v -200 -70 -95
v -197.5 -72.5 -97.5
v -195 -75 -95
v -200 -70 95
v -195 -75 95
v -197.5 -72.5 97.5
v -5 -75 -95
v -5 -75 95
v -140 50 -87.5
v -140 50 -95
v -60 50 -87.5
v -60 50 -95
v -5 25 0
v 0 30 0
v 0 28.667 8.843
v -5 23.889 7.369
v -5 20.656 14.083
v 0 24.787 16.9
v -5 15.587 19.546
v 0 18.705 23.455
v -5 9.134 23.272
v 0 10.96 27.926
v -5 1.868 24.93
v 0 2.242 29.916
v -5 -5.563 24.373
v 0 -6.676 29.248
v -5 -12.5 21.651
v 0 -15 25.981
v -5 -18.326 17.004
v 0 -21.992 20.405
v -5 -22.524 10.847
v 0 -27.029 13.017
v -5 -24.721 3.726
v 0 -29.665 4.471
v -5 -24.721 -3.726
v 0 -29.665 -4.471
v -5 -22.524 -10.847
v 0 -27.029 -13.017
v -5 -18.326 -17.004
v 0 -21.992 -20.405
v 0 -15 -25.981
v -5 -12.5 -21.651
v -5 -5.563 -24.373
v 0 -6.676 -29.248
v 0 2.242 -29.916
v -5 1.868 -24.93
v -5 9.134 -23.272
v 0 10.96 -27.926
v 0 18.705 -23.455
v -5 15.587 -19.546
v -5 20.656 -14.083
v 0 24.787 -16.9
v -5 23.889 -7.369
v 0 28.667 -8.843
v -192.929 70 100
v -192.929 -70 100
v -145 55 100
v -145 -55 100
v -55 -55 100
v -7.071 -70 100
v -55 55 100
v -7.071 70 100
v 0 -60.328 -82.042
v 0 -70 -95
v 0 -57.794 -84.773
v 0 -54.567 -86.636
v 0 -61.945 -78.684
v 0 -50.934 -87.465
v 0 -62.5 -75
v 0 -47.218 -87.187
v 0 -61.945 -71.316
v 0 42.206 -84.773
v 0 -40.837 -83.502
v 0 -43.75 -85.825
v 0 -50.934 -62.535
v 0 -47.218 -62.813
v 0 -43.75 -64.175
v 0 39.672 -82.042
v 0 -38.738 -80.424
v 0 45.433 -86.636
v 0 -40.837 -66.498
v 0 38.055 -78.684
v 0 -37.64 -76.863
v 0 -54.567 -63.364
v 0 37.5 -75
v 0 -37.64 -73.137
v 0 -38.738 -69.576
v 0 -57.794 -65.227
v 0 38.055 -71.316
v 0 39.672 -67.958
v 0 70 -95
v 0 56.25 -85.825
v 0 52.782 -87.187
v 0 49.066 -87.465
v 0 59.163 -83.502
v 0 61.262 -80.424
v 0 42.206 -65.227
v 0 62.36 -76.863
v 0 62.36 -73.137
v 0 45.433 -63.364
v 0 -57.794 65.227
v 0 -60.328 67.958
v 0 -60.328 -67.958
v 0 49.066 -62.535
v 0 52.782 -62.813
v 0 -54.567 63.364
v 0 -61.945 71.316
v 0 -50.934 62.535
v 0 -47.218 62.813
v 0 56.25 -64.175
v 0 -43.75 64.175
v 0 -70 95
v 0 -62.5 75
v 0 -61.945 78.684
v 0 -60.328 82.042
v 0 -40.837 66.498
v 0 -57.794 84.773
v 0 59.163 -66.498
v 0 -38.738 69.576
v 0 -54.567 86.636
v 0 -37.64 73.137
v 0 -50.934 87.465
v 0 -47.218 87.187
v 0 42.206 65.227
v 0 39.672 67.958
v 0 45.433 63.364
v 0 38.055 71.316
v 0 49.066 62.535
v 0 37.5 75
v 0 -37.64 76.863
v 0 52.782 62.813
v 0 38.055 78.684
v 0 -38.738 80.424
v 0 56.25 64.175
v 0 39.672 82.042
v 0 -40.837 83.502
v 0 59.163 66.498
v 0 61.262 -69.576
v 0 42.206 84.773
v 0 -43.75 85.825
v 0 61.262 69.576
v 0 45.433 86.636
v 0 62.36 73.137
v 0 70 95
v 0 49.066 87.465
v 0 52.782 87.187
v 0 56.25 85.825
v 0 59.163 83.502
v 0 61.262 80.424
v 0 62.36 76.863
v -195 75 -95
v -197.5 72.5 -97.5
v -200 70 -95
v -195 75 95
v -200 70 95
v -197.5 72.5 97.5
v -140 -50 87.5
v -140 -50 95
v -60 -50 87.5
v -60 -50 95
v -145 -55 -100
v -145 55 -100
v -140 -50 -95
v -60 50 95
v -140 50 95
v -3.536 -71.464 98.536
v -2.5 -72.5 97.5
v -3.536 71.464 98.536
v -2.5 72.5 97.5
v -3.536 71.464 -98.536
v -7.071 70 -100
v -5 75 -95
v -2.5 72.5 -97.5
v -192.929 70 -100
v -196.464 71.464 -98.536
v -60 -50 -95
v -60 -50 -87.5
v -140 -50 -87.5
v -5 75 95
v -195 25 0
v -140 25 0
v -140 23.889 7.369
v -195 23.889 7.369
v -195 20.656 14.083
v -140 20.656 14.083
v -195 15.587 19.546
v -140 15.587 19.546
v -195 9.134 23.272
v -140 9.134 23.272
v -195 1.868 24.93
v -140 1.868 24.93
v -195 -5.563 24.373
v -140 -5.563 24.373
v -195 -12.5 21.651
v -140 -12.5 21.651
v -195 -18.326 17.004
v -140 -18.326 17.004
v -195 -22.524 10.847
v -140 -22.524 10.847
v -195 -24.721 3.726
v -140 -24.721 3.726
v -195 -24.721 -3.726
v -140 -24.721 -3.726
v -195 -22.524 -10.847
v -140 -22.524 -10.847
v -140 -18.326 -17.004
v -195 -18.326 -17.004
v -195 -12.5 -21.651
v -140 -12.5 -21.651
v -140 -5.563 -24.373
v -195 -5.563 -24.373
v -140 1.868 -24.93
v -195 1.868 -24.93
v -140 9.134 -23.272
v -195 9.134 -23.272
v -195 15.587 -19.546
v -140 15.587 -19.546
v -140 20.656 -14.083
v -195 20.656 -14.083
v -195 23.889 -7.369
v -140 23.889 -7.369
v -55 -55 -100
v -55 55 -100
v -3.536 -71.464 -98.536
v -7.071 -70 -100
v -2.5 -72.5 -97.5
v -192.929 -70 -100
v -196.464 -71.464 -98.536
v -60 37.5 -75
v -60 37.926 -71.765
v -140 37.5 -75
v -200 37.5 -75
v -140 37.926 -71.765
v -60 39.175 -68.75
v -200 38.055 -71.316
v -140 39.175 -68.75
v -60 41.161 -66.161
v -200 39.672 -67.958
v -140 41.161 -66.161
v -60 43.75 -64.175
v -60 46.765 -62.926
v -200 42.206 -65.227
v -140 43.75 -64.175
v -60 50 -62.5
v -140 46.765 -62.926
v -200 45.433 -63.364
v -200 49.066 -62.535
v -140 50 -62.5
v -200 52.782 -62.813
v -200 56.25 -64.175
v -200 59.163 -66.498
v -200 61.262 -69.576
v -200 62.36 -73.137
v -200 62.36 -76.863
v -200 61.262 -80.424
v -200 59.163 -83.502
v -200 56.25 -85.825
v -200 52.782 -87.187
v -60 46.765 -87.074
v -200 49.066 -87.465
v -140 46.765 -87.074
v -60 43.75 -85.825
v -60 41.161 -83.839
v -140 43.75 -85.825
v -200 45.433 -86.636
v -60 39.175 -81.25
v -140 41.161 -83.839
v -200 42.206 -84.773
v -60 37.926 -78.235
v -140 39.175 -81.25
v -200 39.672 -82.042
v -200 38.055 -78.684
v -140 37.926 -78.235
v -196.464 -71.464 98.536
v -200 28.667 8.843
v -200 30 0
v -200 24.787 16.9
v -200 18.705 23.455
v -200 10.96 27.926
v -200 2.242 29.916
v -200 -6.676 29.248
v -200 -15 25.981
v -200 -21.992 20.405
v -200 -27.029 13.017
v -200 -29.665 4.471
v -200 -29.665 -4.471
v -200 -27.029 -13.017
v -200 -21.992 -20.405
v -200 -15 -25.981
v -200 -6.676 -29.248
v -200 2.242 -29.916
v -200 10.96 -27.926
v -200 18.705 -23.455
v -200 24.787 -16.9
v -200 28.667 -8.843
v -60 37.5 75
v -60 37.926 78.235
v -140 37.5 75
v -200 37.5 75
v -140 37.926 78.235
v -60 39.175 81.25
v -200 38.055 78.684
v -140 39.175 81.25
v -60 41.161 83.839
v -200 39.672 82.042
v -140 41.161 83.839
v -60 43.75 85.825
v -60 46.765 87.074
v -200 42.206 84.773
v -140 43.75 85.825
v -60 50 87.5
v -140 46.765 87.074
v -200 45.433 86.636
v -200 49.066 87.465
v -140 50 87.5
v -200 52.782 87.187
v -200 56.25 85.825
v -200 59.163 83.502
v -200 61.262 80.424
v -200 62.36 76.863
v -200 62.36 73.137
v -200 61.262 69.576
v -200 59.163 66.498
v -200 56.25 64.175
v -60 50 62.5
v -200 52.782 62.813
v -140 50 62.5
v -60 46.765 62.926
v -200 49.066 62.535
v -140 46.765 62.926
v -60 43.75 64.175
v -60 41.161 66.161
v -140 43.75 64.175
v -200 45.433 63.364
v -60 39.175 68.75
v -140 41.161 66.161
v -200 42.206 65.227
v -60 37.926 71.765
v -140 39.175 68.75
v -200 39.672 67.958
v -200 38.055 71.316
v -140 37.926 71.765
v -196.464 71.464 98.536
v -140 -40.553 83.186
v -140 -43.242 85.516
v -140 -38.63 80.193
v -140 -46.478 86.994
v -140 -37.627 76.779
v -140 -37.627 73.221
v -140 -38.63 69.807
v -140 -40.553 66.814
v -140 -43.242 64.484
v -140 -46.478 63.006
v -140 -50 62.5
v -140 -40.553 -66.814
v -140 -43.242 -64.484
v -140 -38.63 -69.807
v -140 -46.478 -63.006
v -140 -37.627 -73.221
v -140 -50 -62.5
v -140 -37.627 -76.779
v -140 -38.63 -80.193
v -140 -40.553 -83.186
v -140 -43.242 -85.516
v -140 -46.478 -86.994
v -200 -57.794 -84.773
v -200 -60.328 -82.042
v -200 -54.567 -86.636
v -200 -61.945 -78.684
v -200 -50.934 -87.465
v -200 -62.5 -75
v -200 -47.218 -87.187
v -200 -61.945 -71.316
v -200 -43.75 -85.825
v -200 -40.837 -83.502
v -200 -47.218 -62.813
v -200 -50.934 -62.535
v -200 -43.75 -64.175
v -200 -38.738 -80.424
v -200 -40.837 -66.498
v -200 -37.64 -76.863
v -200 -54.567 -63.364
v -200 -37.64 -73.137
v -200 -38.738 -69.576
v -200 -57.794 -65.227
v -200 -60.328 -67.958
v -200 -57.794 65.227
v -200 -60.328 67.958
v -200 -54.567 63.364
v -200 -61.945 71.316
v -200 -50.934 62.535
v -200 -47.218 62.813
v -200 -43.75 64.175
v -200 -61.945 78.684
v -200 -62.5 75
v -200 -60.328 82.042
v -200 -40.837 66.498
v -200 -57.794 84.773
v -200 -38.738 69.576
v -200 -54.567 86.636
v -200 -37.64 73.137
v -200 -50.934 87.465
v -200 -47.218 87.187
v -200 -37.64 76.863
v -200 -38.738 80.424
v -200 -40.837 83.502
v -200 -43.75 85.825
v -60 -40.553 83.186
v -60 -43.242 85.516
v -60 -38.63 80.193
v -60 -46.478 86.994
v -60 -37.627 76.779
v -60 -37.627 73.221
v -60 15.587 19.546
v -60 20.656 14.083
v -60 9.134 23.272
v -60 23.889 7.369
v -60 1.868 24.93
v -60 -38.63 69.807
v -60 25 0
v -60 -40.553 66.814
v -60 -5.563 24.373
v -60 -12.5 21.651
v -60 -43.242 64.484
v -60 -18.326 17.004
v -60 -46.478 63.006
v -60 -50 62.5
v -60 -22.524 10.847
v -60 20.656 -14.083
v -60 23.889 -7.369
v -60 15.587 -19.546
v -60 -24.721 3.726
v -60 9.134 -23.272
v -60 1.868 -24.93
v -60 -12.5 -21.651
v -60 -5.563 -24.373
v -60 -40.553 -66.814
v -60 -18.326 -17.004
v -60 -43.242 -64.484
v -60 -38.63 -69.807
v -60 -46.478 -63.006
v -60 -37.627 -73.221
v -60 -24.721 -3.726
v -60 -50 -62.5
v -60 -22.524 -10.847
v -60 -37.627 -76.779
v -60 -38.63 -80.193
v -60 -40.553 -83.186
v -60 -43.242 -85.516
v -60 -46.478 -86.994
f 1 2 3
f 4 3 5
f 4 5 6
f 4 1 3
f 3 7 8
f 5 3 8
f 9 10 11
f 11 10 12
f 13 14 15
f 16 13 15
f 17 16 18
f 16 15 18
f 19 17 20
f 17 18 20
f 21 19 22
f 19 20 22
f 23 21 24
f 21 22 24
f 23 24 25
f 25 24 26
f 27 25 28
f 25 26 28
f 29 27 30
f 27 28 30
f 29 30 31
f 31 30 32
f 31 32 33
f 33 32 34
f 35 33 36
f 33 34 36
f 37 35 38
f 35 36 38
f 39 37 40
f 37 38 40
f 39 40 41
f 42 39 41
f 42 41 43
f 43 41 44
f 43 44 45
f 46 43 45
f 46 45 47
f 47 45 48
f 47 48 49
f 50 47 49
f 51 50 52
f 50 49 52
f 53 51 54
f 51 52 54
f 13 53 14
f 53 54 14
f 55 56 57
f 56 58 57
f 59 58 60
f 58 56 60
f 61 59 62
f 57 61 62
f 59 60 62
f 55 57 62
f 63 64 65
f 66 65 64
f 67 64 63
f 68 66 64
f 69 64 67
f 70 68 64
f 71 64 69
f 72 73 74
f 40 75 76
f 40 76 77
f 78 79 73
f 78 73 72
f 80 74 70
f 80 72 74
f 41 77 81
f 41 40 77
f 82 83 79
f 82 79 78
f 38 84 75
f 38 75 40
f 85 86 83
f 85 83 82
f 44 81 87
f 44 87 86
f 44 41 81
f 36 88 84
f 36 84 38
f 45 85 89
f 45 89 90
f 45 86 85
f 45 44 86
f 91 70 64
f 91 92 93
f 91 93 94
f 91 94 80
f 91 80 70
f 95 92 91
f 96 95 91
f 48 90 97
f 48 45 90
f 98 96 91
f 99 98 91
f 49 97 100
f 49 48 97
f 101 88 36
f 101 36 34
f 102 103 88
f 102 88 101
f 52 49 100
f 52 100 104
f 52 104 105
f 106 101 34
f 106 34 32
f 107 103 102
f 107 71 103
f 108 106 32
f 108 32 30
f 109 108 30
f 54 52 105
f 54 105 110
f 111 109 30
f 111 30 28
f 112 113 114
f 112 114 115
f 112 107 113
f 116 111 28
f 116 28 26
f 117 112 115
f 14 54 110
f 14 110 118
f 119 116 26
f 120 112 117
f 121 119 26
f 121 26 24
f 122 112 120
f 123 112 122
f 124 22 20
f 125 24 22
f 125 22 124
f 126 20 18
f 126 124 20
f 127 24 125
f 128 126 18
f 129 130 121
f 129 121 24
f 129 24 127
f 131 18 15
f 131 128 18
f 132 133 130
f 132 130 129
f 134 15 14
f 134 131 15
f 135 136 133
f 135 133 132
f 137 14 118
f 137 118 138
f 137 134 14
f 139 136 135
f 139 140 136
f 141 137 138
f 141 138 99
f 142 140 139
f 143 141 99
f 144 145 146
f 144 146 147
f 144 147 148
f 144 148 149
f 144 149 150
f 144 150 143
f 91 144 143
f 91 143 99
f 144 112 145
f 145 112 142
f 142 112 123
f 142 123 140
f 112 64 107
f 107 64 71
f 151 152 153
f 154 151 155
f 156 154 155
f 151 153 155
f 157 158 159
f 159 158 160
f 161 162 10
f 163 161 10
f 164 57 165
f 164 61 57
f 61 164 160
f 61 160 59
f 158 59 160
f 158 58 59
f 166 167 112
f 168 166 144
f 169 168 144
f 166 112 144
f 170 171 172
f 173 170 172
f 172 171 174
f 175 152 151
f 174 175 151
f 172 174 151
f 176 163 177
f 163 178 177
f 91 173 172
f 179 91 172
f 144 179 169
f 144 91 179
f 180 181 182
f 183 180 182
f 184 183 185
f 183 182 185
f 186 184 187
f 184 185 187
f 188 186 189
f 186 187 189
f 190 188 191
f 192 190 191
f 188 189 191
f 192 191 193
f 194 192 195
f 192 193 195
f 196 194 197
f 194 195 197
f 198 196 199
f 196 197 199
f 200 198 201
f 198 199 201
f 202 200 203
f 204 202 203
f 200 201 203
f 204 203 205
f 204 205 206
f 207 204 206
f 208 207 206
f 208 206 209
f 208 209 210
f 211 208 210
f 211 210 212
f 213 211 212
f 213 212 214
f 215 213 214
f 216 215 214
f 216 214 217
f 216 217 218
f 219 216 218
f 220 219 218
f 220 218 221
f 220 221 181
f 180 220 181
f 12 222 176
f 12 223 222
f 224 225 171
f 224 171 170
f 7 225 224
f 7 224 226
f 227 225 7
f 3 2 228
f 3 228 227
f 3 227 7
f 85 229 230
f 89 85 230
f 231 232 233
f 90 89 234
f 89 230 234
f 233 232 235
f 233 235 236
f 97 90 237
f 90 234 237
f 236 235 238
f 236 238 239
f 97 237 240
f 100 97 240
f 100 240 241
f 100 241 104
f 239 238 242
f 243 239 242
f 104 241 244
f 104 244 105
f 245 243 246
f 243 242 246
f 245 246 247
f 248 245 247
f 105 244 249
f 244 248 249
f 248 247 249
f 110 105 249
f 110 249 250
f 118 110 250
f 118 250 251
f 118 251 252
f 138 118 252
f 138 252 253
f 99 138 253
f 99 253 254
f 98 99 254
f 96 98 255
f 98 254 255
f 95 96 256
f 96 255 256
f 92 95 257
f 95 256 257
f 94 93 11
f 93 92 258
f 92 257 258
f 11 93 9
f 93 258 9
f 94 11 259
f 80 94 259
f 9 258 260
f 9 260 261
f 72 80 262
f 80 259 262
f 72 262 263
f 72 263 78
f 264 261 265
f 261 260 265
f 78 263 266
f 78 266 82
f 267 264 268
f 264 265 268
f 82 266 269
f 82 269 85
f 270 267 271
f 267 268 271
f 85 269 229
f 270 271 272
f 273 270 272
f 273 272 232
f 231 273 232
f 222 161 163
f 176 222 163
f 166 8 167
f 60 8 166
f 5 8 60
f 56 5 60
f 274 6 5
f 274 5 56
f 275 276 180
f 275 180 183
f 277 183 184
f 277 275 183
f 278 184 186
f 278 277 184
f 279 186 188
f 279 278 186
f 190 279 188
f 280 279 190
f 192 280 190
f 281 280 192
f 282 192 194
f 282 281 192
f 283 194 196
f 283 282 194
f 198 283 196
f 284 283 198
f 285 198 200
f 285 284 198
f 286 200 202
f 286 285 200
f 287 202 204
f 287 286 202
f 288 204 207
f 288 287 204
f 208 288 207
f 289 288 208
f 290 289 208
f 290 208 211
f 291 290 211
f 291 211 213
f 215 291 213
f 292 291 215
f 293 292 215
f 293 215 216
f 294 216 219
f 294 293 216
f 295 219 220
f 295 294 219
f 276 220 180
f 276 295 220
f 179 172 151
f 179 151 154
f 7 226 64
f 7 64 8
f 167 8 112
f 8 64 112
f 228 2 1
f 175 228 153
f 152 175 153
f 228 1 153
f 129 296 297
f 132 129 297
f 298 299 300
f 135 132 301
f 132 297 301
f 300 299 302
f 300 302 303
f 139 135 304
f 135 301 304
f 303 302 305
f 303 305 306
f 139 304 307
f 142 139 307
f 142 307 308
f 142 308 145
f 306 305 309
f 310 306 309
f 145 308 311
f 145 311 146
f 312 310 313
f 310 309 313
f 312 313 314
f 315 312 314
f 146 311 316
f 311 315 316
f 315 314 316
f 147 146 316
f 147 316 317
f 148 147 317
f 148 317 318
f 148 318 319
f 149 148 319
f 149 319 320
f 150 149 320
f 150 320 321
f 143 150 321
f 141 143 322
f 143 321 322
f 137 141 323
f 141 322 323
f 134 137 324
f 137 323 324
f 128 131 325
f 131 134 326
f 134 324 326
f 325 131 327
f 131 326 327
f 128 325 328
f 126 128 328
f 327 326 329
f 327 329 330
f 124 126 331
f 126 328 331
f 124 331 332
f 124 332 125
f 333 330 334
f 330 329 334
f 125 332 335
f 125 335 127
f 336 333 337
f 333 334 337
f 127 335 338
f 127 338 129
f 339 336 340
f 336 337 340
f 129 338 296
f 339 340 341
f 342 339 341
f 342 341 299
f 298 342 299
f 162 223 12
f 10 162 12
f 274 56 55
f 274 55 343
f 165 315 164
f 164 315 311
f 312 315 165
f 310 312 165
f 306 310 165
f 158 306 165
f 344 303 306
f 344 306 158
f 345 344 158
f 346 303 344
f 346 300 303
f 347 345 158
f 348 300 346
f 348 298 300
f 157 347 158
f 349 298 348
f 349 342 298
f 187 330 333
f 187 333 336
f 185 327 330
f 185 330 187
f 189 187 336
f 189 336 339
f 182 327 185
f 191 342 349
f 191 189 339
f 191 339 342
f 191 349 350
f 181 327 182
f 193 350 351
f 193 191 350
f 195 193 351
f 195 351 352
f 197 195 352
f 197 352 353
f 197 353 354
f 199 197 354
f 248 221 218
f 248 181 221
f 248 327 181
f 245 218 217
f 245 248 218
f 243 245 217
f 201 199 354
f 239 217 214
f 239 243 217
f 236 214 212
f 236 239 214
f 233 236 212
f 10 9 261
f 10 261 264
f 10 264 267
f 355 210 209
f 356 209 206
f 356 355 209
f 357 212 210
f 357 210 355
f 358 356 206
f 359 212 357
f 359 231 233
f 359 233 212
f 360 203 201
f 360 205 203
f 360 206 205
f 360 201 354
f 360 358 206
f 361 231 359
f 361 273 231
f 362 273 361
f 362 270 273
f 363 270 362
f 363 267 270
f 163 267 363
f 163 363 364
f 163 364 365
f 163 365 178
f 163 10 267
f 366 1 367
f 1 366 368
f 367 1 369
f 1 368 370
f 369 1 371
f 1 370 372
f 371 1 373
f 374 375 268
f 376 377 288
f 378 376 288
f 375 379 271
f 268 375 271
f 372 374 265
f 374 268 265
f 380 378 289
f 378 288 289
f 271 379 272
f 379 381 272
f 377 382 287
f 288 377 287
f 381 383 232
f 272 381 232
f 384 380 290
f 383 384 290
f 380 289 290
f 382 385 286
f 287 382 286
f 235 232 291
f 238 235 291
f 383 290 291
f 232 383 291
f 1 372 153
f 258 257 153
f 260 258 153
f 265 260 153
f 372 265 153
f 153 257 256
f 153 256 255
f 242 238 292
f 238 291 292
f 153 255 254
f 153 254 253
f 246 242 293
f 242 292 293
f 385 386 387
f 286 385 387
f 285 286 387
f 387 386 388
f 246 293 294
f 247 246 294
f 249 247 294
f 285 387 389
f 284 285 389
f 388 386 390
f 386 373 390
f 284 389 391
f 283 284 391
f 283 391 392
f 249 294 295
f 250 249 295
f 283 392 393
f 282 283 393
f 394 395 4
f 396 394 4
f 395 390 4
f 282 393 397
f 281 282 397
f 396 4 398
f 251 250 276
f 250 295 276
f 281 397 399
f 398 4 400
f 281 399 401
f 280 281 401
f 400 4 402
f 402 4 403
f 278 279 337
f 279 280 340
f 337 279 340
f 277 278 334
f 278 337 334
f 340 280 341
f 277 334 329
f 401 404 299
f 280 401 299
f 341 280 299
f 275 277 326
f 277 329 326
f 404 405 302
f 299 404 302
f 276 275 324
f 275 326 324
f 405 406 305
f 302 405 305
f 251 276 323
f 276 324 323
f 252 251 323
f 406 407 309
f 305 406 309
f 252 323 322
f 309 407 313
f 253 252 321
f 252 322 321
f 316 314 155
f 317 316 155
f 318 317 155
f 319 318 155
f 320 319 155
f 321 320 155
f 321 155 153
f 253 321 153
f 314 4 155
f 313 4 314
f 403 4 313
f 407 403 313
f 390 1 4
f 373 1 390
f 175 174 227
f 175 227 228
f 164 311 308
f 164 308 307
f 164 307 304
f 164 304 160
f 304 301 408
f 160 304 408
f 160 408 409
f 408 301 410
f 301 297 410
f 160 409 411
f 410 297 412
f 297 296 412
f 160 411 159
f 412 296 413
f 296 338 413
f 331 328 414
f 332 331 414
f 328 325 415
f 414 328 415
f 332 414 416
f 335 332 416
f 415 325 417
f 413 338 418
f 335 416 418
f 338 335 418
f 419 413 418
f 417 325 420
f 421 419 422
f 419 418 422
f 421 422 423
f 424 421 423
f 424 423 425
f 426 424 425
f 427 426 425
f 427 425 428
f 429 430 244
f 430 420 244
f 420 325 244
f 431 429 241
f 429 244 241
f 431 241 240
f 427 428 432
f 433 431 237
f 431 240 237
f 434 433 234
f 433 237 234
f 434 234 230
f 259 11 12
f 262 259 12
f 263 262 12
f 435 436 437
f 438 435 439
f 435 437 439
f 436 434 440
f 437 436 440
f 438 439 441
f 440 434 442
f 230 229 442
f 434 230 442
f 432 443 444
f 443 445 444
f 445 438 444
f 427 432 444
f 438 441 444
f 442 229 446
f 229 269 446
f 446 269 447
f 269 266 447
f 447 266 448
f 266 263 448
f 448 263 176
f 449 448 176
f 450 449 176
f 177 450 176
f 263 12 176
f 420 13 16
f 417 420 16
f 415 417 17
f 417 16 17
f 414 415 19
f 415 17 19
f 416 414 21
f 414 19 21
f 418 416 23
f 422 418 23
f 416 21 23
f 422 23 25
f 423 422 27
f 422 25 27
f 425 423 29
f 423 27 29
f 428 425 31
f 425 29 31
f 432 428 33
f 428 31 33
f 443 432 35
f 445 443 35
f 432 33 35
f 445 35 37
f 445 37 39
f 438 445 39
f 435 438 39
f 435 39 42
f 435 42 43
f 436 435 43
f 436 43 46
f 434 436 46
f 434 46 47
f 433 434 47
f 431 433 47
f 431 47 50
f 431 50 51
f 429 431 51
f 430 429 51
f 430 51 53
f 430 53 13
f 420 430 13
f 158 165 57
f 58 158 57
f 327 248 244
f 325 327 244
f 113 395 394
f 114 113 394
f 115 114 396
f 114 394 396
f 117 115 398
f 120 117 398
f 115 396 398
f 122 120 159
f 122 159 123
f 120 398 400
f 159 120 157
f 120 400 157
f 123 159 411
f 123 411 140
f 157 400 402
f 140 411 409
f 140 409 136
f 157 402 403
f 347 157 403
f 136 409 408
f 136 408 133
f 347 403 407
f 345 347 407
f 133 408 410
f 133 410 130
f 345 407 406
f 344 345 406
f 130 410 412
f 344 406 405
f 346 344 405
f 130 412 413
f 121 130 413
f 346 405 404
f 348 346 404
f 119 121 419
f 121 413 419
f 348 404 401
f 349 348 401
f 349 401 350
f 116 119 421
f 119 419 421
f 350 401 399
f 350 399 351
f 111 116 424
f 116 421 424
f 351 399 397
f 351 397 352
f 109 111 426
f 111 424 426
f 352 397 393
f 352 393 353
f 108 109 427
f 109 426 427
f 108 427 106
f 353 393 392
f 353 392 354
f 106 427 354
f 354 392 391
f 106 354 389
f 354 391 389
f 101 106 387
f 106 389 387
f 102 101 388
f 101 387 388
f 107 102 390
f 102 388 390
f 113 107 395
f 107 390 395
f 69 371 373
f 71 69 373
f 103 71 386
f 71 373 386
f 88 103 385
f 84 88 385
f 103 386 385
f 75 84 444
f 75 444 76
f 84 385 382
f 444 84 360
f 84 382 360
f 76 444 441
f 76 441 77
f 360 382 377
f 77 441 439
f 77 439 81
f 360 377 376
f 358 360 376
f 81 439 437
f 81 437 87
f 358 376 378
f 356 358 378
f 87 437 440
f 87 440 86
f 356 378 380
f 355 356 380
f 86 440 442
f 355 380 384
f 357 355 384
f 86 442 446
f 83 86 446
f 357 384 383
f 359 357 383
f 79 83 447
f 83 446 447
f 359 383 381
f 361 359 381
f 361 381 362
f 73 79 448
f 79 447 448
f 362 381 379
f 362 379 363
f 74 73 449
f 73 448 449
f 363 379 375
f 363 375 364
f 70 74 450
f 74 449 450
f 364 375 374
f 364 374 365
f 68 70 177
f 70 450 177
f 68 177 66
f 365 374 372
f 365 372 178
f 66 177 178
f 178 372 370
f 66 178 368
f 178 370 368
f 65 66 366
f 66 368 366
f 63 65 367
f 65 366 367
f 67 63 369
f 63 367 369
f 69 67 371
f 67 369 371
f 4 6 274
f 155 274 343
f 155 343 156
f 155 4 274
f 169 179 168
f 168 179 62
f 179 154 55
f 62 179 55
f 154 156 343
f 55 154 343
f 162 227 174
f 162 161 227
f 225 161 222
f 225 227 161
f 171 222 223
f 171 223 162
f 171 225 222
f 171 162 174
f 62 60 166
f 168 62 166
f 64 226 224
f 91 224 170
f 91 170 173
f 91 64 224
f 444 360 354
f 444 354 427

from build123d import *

# Parameters (mm, degrees)
F0_W         = 150
F0_H         = 200
F0_R         = 25
F1_DEPTH     = 200
F2_SIZE      = 5
F3_R         = 12.5
F4_DEPTH     = 200.001
F5_W         = 80
F5_H         = 100
F6_DEPTH     = 200.001
F7_T1_DEPTH  = 215.7168298797
F7_T3_DEPTH  = 161.2857086021
F7_T5_DEPTH  = 100
F7_T7_DEPTH  = 80
F7_T13_DEPTH = 112.8584149398
F7_T17_DEPTH = 92.8584149398
F7_T24_DEPTH = 112.8584149398
F7_T28_DEPTH = 92.8584149398
F7_T35_DEPTH = 92.8584149398
F7_T39_DEPTH = 112.8584149398
F7_T46_DEPTH = 112.8584149398
F7_T50_DEPTH = 92.8584149398
F7_T57_DEPTH = 112.8584149398
F7_T61_DEPTH = 92.8584149398
F7_T68_DEPTH = 112.8584149398
F7_T72_DEPTH = 92.8584149398
F7_T79_DEPTH = 112.8584149398
F7_T83_DEPTH = 92.8584149398
F7_T90_DEPTH = 112.8584149398
F7_T94_DEPTH = 92.8584149398


# Not quite as in the source:
# - a fillet or chamfer that OpenCascade refuses, or shapes differently, is made with other operations: its cross-section is extruded or revolved along the edge and cut away or added


with BuildPart() as f1:
    # F0 (on Right) → F1 (new body)
    with BuildSketch(Plane.YZ):
        Rectangle(F0_W, F0_H)
        Circle(F0_R, mode=Mode.SUBTRACT)
    extrude(amount=-F1_DEPTH)

    # F2
    f2_edges = [f1.edges().sort_by_distance(p)[0] for p in [
        (0, 0, -100),
        (0, 75, 0),
        (0, 0, 100),
        (0, -75, 0),
        (0, -25, 0),
        (-200, 0, -100),
        (-200, 75, 0),
        (-200, 0, 100),
        (-200, -75, 0),
        (-200, -25, 0),
    ]]
    chamfer(f2_edges, length=F2_SIZE)

    # F3 (on face) → F4 (cut, through all)
    with BuildSketch(Plane(origin=(-200, 0, 0), x_dir=(0, -1, 0), z_dir=(-1, 0, 0))):
        with Locations((-50, -75)):
            Circle(F3_R)
        with Locations((-50, 75)):
            Circle(F3_R)
        with Locations((50, -75)):
            Circle(F3_R)
        with Locations((50, 75)):
            Circle(F3_R)
    extrude(amount=-F4_DEPTH, mode=Mode.SUBTRACT)

    # F5 (on face) → F6 (cut, through all)
    with BuildSketch(Plane(origin=(0, 0, -100), x_dir=(1, 0, 0), z_dir=(0, 0, -1))):
        with Locations((-100, 0)):
            Rectangle(F5_W, F5_H)
    extrude(amount=-F6_DEPTH, mode=Mode.SUBTRACT)

    # F7: chamfer of 5 on 16 edges, made by hand

    # F7_s2 → F7_t1 (cut)
    with BuildSketch(Plane.YZ.offset(-207.8584149398)):
        Polygon((-70, -100), (-75, -95), (-75, -100), align=None)
        Polygon((70, -100), (75, -95), (75, -100), align=None)
        Polygon((75, 95), (70, 100), (75, 100), align=None)
        Polygon((-75, 95), (-70, 100), (-75, 100), align=None)
    extrude(amount=F7_T1_DEPTH, mode=Mode.SUBTRACT)

    # F7_s4 → F7_t3 (cut)
    with BuildSketch(Plane.XZ.offset(-80.6428543011)):
        Polygon((-7.0710678119, -100), (-3.5355339059, -98.5355339059), (-5, -100), align=None)
        Polygon((-192.9289321881, -100), (-196.4644660941, -98.5355339059), (-195, -100), align=None)
        Polygon((-7.0710678119, 100), (-3.5355339059, 98.5355339059), (-5, 100), align=None)
        Polygon((-192.9289321881, 100), (-196.4644660941, 98.5355339059), (-195, 100), align=None)
    extrude(amount=F7_T3_DEPTH, mode=Mode.SUBTRACT)

    # F7_s6 → F7_t5 (cut)
    with BuildSketch(Plane.XZ.offset(-50)):
        Polygon((-55, -100), (-60, -95), (-60, -100), align=None)
        Polygon((-145, -100), (-140, -95), (-140, -100), align=None)
        Polygon((-60, 95), (-55, 100), (-60, 100), align=None)
        Polygon((-140, 95), (-145, 100), (-140, 100), align=None)
    extrude(amount=F7_T5_DEPTH, mode=Mode.SUBTRACT)

    # F7_s8 → F7_t7 (cut)
    with BuildSketch(Plane.YZ.offset(-140)):
        Polygon((-55, -100), (-50, -95), (-50, -100), align=None)
        Polygon((55, -100), (50, -95), (50, -100), align=None)
        Polygon((55, 100), (50, 95), (50, 100), align=None)
        Polygon((-55, 100), (-50, 95), (-50, 100), align=None)
    extrude(amount=F7_T7_DEPTH, mode=Mode.SUBTRACT)


with BuildPart() as f7_tool11:
    # F7_s12 → F7_t13 (new body)
    with BuildSketch(Plane.XZ.offset(-62.8584149398)):
        Polygon((-55, -100), (-60, -95), (-60, -100), align=None)
    extrude(amount=F7_T13_DEPTH)

    split(bisect_by=Plane.XZ.offset(-50), keep=Keep.BOTTOM)


with BuildPart() as f7_tool15:
    # F7_s16 → F7_t17 (new body)
    with BuildSketch(Plane.YZ.offset(-140)):
        Polygon((55, -100), (50, -95), (50, -100), align=None)
    extrude(amount=F7_T17_DEPTH)

    split(bisect_by=Plane.YZ.offset(-60), keep=Keep.TOP)


with BuildPart() as f7_tool11_1:
    add(f7_tool11.part)

    # F7_t19: intersect F7_tool15
    add(f7_tool15.part, mode=Mode.INTERSECT)


with BuildPart() as f1_1:
    add(f1.part)

    # F7_t9: cut F7_tool11
    add(f7_tool11_1.part, mode=Mode.SUBTRACT)


with BuildPart() as f7_tool22:
    # F7_s23 → F7_t24 (new body)
    with BuildSketch(Plane.XZ.offset(-50)):
        Polygon((-55, -100), (-60, -95), (-60, -100), align=None)
    extrude(amount=F7_T24_DEPTH)

    split(bisect_by=Plane.XZ.offset(50), keep=Keep.TOP)


with BuildPart() as f7_tool26:
    # F7_s27 → F7_t28 (new body)
    with BuildSketch(Plane.YZ.offset(-47.1415850602)):
        Polygon((-55, -100), (-50, -95), (-50, -100), align=None)
    extrude(amount=-F7_T28_DEPTH)

    split(bisect_by=Plane.YZ.offset(-60), keep=Keep.TOP)


with BuildPart() as f7_tool22_1:
    add(f7_tool22.part)

    # F7_t30: intersect F7_tool26
    add(f7_tool26.part, mode=Mode.INTERSECT)


with BuildPart() as f1_2:
    add(f1_1.part)

    # F7_t20: cut F7_tool22
    add(f7_tool22_1.part, mode=Mode.SUBTRACT)


with BuildPart() as f7_tool33:
    # F7_s34 → F7_t35 (new body)
    with BuildSketch(Plane.YZ.offset(-60)):
        Polygon((-55, -100), (-50, -95), (-50, -100), align=None)
    extrude(amount=-F7_T35_DEPTH)

    split(bisect_by=Plane.YZ.offset(-140), keep=Keep.BOTTOM)


with BuildPart() as f7_tool37:
    # F7_s38 → F7_t39 (new body)
    with BuildSketch(Plane.XZ.offset(62.8584149398)):
        Polygon((-145, -100), (-140, -95), (-140, -100), align=None)
    extrude(amount=-F7_T39_DEPTH)

    split(bisect_by=Plane.XZ.offset(50), keep=Keep.TOP)


with BuildPart() as f7_tool33_1:
    add(f7_tool33.part)

    # F7_t41: intersect F7_tool37
    add(f7_tool37.part, mode=Mode.INTERSECT)


with BuildPart() as f1_3:
    add(f1_2.part)

    # F7_t31: cut F7_tool33
    add(f7_tool33_1.part, mode=Mode.SUBTRACT)


with BuildPart() as f7_tool44:
    # F7_s45 → F7_t46 (new body)
    with BuildSketch(Plane.XZ.offset(50)):
        Polygon((-145, -100), (-140, -95), (-140, -100), align=None)
    extrude(amount=-F7_T46_DEPTH)

    split(bisect_by=Plane.XZ.offset(-50), keep=Keep.BOTTOM)


with BuildPart() as f7_tool48:
    # F7_s49 → F7_t50 (new body)
    with BuildSketch(Plane.YZ.offset(-152.8584149398)):
        Polygon((55, -100), (50, -95), (50, -100), align=None)
    extrude(amount=F7_T50_DEPTH)

    split(bisect_by=Plane.YZ.offset(-140), keep=Keep.BOTTOM)


with BuildPart() as f7_tool44_1:
    add(f7_tool44.part)

    # F7_t52: intersect F7_tool48
    add(f7_tool48.part, mode=Mode.INTERSECT)


with BuildPart() as f1_4:
    add(f1_3.part)

    # F7_t42: cut F7_tool44
    add(f7_tool44_1.part, mode=Mode.SUBTRACT)


with BuildPart() as f7_tool55:
    # F7_s56 → F7_t57 (new body)
    with BuildSketch(Plane.XZ.offset(62.8584149398)):
        Polygon((-60, 95), (-55, 100), (-60, 100), align=None)
    extrude(amount=-F7_T57_DEPTH)

    split(bisect_by=Plane.XZ.offset(50), keep=Keep.TOP)


with BuildPart() as f7_tool59:
    # F7_s60 → F7_t61 (new body)
    with BuildSketch(Plane.YZ.offset(-140)):
        Polygon((-55, 100), (-50, 95), (-50, 100), align=None)
    extrude(amount=F7_T61_DEPTH)

    split(bisect_by=Plane.YZ.offset(-60), keep=Keep.TOP)


with BuildPart() as f7_tool55_1:
    add(f7_tool55.part)

    # F7_t63: intersect F7_tool59
    add(f7_tool59.part, mode=Mode.INTERSECT)


with BuildPart() as f1_5:
    add(f1_4.part)

    # F7_t53: cut F7_tool55
    add(f7_tool55_1.part, mode=Mode.SUBTRACT)


with BuildPart() as f7_tool66:
    # F7_s67 → F7_t68 (new body)
    with BuildSketch(Plane.XZ.offset(50)):
        Polygon((-60, 95), (-55, 100), (-60, 100), align=None)
    extrude(amount=-F7_T68_DEPTH)

    split(bisect_by=Plane.XZ.offset(-50), keep=Keep.BOTTOM)


with BuildPart() as f7_tool70:
    # F7_s71 → F7_t72 (new body)
    with BuildSketch(Plane.YZ.offset(-47.1415850602)):
        Polygon((55, 100), (50, 95), (50, 100), align=None)
    extrude(amount=-F7_T72_DEPTH)

    split(bisect_by=Plane.YZ.offset(-60), keep=Keep.TOP)


with BuildPart() as f7_tool66_1:
    add(f7_tool66.part)

    # F7_t74: intersect F7_tool70
    add(f7_tool70.part, mode=Mode.INTERSECT)


with BuildPart() as f1_6:
    add(f1_5.part)

    # F7_t64: cut F7_tool66
    add(f7_tool66_1.part, mode=Mode.SUBTRACT)


with BuildPart() as f7_tool77:
    # F7_s78 → F7_t79 (new body)
    with BuildSketch(Plane.XZ.offset(-62.8584149398)):
        Polygon((-140, 95), (-145, 100), (-140, 100), align=None)
    extrude(amount=F7_T79_DEPTH)

    split(bisect_by=Plane.XZ.offset(-50), keep=Keep.BOTTOM)


with BuildPart() as f7_tool81:
    # F7_s82 → F7_t83 (new body)
    with BuildSketch(Plane.YZ.offset(-60)):
        Polygon((55, 100), (50, 95), (50, 100), align=None)
    extrude(amount=-F7_T83_DEPTH)

    split(bisect_by=Plane.YZ.offset(-140), keep=Keep.BOTTOM)


with BuildPart() as f7_tool77_1:
    add(f7_tool77.part)

    # F7_t85: intersect F7_tool81
    add(f7_tool81.part, mode=Mode.INTERSECT)


with BuildPart() as f1_7:
    add(f1_6.part)

    # F7_t75: cut F7_tool77
    add(f7_tool77_1.part, mode=Mode.SUBTRACT)


with BuildPart() as f7_tool88:
    # F7_s89 → F7_t90 (new body)
    with BuildSketch(Plane.XZ.offset(-50)):
        Polygon((-140, 95), (-145, 100), (-140, 100), align=None)
    extrude(amount=F7_T90_DEPTH)

    split(bisect_by=Plane.XZ.offset(50), keep=Keep.TOP)


with BuildPart() as f7_tool92:
    # F7_s93 → F7_t94 (new body)
    with BuildSketch(Plane.YZ.offset(-152.8584149398)):
        Polygon((-55, 100), (-50, 95), (-50, 100), align=None)
    extrude(amount=F7_T94_DEPTH)

    split(bisect_by=Plane.YZ.offset(-140), keep=Keep.BOTTOM)


with BuildPart() as f7_tool88_1:
    add(f7_tool88.part)

    # F7_t96: intersect F7_tool92
    add(f7_tool92.part, mode=Mode.INTERSECT)


with BuildPart() as f1_8:
    add(f1_7.part)

    # F7_t86: cut F7_tool88
    add(f7_tool88_1.part, mode=Mode.SUBTRACT)


solid = f1_8.part
